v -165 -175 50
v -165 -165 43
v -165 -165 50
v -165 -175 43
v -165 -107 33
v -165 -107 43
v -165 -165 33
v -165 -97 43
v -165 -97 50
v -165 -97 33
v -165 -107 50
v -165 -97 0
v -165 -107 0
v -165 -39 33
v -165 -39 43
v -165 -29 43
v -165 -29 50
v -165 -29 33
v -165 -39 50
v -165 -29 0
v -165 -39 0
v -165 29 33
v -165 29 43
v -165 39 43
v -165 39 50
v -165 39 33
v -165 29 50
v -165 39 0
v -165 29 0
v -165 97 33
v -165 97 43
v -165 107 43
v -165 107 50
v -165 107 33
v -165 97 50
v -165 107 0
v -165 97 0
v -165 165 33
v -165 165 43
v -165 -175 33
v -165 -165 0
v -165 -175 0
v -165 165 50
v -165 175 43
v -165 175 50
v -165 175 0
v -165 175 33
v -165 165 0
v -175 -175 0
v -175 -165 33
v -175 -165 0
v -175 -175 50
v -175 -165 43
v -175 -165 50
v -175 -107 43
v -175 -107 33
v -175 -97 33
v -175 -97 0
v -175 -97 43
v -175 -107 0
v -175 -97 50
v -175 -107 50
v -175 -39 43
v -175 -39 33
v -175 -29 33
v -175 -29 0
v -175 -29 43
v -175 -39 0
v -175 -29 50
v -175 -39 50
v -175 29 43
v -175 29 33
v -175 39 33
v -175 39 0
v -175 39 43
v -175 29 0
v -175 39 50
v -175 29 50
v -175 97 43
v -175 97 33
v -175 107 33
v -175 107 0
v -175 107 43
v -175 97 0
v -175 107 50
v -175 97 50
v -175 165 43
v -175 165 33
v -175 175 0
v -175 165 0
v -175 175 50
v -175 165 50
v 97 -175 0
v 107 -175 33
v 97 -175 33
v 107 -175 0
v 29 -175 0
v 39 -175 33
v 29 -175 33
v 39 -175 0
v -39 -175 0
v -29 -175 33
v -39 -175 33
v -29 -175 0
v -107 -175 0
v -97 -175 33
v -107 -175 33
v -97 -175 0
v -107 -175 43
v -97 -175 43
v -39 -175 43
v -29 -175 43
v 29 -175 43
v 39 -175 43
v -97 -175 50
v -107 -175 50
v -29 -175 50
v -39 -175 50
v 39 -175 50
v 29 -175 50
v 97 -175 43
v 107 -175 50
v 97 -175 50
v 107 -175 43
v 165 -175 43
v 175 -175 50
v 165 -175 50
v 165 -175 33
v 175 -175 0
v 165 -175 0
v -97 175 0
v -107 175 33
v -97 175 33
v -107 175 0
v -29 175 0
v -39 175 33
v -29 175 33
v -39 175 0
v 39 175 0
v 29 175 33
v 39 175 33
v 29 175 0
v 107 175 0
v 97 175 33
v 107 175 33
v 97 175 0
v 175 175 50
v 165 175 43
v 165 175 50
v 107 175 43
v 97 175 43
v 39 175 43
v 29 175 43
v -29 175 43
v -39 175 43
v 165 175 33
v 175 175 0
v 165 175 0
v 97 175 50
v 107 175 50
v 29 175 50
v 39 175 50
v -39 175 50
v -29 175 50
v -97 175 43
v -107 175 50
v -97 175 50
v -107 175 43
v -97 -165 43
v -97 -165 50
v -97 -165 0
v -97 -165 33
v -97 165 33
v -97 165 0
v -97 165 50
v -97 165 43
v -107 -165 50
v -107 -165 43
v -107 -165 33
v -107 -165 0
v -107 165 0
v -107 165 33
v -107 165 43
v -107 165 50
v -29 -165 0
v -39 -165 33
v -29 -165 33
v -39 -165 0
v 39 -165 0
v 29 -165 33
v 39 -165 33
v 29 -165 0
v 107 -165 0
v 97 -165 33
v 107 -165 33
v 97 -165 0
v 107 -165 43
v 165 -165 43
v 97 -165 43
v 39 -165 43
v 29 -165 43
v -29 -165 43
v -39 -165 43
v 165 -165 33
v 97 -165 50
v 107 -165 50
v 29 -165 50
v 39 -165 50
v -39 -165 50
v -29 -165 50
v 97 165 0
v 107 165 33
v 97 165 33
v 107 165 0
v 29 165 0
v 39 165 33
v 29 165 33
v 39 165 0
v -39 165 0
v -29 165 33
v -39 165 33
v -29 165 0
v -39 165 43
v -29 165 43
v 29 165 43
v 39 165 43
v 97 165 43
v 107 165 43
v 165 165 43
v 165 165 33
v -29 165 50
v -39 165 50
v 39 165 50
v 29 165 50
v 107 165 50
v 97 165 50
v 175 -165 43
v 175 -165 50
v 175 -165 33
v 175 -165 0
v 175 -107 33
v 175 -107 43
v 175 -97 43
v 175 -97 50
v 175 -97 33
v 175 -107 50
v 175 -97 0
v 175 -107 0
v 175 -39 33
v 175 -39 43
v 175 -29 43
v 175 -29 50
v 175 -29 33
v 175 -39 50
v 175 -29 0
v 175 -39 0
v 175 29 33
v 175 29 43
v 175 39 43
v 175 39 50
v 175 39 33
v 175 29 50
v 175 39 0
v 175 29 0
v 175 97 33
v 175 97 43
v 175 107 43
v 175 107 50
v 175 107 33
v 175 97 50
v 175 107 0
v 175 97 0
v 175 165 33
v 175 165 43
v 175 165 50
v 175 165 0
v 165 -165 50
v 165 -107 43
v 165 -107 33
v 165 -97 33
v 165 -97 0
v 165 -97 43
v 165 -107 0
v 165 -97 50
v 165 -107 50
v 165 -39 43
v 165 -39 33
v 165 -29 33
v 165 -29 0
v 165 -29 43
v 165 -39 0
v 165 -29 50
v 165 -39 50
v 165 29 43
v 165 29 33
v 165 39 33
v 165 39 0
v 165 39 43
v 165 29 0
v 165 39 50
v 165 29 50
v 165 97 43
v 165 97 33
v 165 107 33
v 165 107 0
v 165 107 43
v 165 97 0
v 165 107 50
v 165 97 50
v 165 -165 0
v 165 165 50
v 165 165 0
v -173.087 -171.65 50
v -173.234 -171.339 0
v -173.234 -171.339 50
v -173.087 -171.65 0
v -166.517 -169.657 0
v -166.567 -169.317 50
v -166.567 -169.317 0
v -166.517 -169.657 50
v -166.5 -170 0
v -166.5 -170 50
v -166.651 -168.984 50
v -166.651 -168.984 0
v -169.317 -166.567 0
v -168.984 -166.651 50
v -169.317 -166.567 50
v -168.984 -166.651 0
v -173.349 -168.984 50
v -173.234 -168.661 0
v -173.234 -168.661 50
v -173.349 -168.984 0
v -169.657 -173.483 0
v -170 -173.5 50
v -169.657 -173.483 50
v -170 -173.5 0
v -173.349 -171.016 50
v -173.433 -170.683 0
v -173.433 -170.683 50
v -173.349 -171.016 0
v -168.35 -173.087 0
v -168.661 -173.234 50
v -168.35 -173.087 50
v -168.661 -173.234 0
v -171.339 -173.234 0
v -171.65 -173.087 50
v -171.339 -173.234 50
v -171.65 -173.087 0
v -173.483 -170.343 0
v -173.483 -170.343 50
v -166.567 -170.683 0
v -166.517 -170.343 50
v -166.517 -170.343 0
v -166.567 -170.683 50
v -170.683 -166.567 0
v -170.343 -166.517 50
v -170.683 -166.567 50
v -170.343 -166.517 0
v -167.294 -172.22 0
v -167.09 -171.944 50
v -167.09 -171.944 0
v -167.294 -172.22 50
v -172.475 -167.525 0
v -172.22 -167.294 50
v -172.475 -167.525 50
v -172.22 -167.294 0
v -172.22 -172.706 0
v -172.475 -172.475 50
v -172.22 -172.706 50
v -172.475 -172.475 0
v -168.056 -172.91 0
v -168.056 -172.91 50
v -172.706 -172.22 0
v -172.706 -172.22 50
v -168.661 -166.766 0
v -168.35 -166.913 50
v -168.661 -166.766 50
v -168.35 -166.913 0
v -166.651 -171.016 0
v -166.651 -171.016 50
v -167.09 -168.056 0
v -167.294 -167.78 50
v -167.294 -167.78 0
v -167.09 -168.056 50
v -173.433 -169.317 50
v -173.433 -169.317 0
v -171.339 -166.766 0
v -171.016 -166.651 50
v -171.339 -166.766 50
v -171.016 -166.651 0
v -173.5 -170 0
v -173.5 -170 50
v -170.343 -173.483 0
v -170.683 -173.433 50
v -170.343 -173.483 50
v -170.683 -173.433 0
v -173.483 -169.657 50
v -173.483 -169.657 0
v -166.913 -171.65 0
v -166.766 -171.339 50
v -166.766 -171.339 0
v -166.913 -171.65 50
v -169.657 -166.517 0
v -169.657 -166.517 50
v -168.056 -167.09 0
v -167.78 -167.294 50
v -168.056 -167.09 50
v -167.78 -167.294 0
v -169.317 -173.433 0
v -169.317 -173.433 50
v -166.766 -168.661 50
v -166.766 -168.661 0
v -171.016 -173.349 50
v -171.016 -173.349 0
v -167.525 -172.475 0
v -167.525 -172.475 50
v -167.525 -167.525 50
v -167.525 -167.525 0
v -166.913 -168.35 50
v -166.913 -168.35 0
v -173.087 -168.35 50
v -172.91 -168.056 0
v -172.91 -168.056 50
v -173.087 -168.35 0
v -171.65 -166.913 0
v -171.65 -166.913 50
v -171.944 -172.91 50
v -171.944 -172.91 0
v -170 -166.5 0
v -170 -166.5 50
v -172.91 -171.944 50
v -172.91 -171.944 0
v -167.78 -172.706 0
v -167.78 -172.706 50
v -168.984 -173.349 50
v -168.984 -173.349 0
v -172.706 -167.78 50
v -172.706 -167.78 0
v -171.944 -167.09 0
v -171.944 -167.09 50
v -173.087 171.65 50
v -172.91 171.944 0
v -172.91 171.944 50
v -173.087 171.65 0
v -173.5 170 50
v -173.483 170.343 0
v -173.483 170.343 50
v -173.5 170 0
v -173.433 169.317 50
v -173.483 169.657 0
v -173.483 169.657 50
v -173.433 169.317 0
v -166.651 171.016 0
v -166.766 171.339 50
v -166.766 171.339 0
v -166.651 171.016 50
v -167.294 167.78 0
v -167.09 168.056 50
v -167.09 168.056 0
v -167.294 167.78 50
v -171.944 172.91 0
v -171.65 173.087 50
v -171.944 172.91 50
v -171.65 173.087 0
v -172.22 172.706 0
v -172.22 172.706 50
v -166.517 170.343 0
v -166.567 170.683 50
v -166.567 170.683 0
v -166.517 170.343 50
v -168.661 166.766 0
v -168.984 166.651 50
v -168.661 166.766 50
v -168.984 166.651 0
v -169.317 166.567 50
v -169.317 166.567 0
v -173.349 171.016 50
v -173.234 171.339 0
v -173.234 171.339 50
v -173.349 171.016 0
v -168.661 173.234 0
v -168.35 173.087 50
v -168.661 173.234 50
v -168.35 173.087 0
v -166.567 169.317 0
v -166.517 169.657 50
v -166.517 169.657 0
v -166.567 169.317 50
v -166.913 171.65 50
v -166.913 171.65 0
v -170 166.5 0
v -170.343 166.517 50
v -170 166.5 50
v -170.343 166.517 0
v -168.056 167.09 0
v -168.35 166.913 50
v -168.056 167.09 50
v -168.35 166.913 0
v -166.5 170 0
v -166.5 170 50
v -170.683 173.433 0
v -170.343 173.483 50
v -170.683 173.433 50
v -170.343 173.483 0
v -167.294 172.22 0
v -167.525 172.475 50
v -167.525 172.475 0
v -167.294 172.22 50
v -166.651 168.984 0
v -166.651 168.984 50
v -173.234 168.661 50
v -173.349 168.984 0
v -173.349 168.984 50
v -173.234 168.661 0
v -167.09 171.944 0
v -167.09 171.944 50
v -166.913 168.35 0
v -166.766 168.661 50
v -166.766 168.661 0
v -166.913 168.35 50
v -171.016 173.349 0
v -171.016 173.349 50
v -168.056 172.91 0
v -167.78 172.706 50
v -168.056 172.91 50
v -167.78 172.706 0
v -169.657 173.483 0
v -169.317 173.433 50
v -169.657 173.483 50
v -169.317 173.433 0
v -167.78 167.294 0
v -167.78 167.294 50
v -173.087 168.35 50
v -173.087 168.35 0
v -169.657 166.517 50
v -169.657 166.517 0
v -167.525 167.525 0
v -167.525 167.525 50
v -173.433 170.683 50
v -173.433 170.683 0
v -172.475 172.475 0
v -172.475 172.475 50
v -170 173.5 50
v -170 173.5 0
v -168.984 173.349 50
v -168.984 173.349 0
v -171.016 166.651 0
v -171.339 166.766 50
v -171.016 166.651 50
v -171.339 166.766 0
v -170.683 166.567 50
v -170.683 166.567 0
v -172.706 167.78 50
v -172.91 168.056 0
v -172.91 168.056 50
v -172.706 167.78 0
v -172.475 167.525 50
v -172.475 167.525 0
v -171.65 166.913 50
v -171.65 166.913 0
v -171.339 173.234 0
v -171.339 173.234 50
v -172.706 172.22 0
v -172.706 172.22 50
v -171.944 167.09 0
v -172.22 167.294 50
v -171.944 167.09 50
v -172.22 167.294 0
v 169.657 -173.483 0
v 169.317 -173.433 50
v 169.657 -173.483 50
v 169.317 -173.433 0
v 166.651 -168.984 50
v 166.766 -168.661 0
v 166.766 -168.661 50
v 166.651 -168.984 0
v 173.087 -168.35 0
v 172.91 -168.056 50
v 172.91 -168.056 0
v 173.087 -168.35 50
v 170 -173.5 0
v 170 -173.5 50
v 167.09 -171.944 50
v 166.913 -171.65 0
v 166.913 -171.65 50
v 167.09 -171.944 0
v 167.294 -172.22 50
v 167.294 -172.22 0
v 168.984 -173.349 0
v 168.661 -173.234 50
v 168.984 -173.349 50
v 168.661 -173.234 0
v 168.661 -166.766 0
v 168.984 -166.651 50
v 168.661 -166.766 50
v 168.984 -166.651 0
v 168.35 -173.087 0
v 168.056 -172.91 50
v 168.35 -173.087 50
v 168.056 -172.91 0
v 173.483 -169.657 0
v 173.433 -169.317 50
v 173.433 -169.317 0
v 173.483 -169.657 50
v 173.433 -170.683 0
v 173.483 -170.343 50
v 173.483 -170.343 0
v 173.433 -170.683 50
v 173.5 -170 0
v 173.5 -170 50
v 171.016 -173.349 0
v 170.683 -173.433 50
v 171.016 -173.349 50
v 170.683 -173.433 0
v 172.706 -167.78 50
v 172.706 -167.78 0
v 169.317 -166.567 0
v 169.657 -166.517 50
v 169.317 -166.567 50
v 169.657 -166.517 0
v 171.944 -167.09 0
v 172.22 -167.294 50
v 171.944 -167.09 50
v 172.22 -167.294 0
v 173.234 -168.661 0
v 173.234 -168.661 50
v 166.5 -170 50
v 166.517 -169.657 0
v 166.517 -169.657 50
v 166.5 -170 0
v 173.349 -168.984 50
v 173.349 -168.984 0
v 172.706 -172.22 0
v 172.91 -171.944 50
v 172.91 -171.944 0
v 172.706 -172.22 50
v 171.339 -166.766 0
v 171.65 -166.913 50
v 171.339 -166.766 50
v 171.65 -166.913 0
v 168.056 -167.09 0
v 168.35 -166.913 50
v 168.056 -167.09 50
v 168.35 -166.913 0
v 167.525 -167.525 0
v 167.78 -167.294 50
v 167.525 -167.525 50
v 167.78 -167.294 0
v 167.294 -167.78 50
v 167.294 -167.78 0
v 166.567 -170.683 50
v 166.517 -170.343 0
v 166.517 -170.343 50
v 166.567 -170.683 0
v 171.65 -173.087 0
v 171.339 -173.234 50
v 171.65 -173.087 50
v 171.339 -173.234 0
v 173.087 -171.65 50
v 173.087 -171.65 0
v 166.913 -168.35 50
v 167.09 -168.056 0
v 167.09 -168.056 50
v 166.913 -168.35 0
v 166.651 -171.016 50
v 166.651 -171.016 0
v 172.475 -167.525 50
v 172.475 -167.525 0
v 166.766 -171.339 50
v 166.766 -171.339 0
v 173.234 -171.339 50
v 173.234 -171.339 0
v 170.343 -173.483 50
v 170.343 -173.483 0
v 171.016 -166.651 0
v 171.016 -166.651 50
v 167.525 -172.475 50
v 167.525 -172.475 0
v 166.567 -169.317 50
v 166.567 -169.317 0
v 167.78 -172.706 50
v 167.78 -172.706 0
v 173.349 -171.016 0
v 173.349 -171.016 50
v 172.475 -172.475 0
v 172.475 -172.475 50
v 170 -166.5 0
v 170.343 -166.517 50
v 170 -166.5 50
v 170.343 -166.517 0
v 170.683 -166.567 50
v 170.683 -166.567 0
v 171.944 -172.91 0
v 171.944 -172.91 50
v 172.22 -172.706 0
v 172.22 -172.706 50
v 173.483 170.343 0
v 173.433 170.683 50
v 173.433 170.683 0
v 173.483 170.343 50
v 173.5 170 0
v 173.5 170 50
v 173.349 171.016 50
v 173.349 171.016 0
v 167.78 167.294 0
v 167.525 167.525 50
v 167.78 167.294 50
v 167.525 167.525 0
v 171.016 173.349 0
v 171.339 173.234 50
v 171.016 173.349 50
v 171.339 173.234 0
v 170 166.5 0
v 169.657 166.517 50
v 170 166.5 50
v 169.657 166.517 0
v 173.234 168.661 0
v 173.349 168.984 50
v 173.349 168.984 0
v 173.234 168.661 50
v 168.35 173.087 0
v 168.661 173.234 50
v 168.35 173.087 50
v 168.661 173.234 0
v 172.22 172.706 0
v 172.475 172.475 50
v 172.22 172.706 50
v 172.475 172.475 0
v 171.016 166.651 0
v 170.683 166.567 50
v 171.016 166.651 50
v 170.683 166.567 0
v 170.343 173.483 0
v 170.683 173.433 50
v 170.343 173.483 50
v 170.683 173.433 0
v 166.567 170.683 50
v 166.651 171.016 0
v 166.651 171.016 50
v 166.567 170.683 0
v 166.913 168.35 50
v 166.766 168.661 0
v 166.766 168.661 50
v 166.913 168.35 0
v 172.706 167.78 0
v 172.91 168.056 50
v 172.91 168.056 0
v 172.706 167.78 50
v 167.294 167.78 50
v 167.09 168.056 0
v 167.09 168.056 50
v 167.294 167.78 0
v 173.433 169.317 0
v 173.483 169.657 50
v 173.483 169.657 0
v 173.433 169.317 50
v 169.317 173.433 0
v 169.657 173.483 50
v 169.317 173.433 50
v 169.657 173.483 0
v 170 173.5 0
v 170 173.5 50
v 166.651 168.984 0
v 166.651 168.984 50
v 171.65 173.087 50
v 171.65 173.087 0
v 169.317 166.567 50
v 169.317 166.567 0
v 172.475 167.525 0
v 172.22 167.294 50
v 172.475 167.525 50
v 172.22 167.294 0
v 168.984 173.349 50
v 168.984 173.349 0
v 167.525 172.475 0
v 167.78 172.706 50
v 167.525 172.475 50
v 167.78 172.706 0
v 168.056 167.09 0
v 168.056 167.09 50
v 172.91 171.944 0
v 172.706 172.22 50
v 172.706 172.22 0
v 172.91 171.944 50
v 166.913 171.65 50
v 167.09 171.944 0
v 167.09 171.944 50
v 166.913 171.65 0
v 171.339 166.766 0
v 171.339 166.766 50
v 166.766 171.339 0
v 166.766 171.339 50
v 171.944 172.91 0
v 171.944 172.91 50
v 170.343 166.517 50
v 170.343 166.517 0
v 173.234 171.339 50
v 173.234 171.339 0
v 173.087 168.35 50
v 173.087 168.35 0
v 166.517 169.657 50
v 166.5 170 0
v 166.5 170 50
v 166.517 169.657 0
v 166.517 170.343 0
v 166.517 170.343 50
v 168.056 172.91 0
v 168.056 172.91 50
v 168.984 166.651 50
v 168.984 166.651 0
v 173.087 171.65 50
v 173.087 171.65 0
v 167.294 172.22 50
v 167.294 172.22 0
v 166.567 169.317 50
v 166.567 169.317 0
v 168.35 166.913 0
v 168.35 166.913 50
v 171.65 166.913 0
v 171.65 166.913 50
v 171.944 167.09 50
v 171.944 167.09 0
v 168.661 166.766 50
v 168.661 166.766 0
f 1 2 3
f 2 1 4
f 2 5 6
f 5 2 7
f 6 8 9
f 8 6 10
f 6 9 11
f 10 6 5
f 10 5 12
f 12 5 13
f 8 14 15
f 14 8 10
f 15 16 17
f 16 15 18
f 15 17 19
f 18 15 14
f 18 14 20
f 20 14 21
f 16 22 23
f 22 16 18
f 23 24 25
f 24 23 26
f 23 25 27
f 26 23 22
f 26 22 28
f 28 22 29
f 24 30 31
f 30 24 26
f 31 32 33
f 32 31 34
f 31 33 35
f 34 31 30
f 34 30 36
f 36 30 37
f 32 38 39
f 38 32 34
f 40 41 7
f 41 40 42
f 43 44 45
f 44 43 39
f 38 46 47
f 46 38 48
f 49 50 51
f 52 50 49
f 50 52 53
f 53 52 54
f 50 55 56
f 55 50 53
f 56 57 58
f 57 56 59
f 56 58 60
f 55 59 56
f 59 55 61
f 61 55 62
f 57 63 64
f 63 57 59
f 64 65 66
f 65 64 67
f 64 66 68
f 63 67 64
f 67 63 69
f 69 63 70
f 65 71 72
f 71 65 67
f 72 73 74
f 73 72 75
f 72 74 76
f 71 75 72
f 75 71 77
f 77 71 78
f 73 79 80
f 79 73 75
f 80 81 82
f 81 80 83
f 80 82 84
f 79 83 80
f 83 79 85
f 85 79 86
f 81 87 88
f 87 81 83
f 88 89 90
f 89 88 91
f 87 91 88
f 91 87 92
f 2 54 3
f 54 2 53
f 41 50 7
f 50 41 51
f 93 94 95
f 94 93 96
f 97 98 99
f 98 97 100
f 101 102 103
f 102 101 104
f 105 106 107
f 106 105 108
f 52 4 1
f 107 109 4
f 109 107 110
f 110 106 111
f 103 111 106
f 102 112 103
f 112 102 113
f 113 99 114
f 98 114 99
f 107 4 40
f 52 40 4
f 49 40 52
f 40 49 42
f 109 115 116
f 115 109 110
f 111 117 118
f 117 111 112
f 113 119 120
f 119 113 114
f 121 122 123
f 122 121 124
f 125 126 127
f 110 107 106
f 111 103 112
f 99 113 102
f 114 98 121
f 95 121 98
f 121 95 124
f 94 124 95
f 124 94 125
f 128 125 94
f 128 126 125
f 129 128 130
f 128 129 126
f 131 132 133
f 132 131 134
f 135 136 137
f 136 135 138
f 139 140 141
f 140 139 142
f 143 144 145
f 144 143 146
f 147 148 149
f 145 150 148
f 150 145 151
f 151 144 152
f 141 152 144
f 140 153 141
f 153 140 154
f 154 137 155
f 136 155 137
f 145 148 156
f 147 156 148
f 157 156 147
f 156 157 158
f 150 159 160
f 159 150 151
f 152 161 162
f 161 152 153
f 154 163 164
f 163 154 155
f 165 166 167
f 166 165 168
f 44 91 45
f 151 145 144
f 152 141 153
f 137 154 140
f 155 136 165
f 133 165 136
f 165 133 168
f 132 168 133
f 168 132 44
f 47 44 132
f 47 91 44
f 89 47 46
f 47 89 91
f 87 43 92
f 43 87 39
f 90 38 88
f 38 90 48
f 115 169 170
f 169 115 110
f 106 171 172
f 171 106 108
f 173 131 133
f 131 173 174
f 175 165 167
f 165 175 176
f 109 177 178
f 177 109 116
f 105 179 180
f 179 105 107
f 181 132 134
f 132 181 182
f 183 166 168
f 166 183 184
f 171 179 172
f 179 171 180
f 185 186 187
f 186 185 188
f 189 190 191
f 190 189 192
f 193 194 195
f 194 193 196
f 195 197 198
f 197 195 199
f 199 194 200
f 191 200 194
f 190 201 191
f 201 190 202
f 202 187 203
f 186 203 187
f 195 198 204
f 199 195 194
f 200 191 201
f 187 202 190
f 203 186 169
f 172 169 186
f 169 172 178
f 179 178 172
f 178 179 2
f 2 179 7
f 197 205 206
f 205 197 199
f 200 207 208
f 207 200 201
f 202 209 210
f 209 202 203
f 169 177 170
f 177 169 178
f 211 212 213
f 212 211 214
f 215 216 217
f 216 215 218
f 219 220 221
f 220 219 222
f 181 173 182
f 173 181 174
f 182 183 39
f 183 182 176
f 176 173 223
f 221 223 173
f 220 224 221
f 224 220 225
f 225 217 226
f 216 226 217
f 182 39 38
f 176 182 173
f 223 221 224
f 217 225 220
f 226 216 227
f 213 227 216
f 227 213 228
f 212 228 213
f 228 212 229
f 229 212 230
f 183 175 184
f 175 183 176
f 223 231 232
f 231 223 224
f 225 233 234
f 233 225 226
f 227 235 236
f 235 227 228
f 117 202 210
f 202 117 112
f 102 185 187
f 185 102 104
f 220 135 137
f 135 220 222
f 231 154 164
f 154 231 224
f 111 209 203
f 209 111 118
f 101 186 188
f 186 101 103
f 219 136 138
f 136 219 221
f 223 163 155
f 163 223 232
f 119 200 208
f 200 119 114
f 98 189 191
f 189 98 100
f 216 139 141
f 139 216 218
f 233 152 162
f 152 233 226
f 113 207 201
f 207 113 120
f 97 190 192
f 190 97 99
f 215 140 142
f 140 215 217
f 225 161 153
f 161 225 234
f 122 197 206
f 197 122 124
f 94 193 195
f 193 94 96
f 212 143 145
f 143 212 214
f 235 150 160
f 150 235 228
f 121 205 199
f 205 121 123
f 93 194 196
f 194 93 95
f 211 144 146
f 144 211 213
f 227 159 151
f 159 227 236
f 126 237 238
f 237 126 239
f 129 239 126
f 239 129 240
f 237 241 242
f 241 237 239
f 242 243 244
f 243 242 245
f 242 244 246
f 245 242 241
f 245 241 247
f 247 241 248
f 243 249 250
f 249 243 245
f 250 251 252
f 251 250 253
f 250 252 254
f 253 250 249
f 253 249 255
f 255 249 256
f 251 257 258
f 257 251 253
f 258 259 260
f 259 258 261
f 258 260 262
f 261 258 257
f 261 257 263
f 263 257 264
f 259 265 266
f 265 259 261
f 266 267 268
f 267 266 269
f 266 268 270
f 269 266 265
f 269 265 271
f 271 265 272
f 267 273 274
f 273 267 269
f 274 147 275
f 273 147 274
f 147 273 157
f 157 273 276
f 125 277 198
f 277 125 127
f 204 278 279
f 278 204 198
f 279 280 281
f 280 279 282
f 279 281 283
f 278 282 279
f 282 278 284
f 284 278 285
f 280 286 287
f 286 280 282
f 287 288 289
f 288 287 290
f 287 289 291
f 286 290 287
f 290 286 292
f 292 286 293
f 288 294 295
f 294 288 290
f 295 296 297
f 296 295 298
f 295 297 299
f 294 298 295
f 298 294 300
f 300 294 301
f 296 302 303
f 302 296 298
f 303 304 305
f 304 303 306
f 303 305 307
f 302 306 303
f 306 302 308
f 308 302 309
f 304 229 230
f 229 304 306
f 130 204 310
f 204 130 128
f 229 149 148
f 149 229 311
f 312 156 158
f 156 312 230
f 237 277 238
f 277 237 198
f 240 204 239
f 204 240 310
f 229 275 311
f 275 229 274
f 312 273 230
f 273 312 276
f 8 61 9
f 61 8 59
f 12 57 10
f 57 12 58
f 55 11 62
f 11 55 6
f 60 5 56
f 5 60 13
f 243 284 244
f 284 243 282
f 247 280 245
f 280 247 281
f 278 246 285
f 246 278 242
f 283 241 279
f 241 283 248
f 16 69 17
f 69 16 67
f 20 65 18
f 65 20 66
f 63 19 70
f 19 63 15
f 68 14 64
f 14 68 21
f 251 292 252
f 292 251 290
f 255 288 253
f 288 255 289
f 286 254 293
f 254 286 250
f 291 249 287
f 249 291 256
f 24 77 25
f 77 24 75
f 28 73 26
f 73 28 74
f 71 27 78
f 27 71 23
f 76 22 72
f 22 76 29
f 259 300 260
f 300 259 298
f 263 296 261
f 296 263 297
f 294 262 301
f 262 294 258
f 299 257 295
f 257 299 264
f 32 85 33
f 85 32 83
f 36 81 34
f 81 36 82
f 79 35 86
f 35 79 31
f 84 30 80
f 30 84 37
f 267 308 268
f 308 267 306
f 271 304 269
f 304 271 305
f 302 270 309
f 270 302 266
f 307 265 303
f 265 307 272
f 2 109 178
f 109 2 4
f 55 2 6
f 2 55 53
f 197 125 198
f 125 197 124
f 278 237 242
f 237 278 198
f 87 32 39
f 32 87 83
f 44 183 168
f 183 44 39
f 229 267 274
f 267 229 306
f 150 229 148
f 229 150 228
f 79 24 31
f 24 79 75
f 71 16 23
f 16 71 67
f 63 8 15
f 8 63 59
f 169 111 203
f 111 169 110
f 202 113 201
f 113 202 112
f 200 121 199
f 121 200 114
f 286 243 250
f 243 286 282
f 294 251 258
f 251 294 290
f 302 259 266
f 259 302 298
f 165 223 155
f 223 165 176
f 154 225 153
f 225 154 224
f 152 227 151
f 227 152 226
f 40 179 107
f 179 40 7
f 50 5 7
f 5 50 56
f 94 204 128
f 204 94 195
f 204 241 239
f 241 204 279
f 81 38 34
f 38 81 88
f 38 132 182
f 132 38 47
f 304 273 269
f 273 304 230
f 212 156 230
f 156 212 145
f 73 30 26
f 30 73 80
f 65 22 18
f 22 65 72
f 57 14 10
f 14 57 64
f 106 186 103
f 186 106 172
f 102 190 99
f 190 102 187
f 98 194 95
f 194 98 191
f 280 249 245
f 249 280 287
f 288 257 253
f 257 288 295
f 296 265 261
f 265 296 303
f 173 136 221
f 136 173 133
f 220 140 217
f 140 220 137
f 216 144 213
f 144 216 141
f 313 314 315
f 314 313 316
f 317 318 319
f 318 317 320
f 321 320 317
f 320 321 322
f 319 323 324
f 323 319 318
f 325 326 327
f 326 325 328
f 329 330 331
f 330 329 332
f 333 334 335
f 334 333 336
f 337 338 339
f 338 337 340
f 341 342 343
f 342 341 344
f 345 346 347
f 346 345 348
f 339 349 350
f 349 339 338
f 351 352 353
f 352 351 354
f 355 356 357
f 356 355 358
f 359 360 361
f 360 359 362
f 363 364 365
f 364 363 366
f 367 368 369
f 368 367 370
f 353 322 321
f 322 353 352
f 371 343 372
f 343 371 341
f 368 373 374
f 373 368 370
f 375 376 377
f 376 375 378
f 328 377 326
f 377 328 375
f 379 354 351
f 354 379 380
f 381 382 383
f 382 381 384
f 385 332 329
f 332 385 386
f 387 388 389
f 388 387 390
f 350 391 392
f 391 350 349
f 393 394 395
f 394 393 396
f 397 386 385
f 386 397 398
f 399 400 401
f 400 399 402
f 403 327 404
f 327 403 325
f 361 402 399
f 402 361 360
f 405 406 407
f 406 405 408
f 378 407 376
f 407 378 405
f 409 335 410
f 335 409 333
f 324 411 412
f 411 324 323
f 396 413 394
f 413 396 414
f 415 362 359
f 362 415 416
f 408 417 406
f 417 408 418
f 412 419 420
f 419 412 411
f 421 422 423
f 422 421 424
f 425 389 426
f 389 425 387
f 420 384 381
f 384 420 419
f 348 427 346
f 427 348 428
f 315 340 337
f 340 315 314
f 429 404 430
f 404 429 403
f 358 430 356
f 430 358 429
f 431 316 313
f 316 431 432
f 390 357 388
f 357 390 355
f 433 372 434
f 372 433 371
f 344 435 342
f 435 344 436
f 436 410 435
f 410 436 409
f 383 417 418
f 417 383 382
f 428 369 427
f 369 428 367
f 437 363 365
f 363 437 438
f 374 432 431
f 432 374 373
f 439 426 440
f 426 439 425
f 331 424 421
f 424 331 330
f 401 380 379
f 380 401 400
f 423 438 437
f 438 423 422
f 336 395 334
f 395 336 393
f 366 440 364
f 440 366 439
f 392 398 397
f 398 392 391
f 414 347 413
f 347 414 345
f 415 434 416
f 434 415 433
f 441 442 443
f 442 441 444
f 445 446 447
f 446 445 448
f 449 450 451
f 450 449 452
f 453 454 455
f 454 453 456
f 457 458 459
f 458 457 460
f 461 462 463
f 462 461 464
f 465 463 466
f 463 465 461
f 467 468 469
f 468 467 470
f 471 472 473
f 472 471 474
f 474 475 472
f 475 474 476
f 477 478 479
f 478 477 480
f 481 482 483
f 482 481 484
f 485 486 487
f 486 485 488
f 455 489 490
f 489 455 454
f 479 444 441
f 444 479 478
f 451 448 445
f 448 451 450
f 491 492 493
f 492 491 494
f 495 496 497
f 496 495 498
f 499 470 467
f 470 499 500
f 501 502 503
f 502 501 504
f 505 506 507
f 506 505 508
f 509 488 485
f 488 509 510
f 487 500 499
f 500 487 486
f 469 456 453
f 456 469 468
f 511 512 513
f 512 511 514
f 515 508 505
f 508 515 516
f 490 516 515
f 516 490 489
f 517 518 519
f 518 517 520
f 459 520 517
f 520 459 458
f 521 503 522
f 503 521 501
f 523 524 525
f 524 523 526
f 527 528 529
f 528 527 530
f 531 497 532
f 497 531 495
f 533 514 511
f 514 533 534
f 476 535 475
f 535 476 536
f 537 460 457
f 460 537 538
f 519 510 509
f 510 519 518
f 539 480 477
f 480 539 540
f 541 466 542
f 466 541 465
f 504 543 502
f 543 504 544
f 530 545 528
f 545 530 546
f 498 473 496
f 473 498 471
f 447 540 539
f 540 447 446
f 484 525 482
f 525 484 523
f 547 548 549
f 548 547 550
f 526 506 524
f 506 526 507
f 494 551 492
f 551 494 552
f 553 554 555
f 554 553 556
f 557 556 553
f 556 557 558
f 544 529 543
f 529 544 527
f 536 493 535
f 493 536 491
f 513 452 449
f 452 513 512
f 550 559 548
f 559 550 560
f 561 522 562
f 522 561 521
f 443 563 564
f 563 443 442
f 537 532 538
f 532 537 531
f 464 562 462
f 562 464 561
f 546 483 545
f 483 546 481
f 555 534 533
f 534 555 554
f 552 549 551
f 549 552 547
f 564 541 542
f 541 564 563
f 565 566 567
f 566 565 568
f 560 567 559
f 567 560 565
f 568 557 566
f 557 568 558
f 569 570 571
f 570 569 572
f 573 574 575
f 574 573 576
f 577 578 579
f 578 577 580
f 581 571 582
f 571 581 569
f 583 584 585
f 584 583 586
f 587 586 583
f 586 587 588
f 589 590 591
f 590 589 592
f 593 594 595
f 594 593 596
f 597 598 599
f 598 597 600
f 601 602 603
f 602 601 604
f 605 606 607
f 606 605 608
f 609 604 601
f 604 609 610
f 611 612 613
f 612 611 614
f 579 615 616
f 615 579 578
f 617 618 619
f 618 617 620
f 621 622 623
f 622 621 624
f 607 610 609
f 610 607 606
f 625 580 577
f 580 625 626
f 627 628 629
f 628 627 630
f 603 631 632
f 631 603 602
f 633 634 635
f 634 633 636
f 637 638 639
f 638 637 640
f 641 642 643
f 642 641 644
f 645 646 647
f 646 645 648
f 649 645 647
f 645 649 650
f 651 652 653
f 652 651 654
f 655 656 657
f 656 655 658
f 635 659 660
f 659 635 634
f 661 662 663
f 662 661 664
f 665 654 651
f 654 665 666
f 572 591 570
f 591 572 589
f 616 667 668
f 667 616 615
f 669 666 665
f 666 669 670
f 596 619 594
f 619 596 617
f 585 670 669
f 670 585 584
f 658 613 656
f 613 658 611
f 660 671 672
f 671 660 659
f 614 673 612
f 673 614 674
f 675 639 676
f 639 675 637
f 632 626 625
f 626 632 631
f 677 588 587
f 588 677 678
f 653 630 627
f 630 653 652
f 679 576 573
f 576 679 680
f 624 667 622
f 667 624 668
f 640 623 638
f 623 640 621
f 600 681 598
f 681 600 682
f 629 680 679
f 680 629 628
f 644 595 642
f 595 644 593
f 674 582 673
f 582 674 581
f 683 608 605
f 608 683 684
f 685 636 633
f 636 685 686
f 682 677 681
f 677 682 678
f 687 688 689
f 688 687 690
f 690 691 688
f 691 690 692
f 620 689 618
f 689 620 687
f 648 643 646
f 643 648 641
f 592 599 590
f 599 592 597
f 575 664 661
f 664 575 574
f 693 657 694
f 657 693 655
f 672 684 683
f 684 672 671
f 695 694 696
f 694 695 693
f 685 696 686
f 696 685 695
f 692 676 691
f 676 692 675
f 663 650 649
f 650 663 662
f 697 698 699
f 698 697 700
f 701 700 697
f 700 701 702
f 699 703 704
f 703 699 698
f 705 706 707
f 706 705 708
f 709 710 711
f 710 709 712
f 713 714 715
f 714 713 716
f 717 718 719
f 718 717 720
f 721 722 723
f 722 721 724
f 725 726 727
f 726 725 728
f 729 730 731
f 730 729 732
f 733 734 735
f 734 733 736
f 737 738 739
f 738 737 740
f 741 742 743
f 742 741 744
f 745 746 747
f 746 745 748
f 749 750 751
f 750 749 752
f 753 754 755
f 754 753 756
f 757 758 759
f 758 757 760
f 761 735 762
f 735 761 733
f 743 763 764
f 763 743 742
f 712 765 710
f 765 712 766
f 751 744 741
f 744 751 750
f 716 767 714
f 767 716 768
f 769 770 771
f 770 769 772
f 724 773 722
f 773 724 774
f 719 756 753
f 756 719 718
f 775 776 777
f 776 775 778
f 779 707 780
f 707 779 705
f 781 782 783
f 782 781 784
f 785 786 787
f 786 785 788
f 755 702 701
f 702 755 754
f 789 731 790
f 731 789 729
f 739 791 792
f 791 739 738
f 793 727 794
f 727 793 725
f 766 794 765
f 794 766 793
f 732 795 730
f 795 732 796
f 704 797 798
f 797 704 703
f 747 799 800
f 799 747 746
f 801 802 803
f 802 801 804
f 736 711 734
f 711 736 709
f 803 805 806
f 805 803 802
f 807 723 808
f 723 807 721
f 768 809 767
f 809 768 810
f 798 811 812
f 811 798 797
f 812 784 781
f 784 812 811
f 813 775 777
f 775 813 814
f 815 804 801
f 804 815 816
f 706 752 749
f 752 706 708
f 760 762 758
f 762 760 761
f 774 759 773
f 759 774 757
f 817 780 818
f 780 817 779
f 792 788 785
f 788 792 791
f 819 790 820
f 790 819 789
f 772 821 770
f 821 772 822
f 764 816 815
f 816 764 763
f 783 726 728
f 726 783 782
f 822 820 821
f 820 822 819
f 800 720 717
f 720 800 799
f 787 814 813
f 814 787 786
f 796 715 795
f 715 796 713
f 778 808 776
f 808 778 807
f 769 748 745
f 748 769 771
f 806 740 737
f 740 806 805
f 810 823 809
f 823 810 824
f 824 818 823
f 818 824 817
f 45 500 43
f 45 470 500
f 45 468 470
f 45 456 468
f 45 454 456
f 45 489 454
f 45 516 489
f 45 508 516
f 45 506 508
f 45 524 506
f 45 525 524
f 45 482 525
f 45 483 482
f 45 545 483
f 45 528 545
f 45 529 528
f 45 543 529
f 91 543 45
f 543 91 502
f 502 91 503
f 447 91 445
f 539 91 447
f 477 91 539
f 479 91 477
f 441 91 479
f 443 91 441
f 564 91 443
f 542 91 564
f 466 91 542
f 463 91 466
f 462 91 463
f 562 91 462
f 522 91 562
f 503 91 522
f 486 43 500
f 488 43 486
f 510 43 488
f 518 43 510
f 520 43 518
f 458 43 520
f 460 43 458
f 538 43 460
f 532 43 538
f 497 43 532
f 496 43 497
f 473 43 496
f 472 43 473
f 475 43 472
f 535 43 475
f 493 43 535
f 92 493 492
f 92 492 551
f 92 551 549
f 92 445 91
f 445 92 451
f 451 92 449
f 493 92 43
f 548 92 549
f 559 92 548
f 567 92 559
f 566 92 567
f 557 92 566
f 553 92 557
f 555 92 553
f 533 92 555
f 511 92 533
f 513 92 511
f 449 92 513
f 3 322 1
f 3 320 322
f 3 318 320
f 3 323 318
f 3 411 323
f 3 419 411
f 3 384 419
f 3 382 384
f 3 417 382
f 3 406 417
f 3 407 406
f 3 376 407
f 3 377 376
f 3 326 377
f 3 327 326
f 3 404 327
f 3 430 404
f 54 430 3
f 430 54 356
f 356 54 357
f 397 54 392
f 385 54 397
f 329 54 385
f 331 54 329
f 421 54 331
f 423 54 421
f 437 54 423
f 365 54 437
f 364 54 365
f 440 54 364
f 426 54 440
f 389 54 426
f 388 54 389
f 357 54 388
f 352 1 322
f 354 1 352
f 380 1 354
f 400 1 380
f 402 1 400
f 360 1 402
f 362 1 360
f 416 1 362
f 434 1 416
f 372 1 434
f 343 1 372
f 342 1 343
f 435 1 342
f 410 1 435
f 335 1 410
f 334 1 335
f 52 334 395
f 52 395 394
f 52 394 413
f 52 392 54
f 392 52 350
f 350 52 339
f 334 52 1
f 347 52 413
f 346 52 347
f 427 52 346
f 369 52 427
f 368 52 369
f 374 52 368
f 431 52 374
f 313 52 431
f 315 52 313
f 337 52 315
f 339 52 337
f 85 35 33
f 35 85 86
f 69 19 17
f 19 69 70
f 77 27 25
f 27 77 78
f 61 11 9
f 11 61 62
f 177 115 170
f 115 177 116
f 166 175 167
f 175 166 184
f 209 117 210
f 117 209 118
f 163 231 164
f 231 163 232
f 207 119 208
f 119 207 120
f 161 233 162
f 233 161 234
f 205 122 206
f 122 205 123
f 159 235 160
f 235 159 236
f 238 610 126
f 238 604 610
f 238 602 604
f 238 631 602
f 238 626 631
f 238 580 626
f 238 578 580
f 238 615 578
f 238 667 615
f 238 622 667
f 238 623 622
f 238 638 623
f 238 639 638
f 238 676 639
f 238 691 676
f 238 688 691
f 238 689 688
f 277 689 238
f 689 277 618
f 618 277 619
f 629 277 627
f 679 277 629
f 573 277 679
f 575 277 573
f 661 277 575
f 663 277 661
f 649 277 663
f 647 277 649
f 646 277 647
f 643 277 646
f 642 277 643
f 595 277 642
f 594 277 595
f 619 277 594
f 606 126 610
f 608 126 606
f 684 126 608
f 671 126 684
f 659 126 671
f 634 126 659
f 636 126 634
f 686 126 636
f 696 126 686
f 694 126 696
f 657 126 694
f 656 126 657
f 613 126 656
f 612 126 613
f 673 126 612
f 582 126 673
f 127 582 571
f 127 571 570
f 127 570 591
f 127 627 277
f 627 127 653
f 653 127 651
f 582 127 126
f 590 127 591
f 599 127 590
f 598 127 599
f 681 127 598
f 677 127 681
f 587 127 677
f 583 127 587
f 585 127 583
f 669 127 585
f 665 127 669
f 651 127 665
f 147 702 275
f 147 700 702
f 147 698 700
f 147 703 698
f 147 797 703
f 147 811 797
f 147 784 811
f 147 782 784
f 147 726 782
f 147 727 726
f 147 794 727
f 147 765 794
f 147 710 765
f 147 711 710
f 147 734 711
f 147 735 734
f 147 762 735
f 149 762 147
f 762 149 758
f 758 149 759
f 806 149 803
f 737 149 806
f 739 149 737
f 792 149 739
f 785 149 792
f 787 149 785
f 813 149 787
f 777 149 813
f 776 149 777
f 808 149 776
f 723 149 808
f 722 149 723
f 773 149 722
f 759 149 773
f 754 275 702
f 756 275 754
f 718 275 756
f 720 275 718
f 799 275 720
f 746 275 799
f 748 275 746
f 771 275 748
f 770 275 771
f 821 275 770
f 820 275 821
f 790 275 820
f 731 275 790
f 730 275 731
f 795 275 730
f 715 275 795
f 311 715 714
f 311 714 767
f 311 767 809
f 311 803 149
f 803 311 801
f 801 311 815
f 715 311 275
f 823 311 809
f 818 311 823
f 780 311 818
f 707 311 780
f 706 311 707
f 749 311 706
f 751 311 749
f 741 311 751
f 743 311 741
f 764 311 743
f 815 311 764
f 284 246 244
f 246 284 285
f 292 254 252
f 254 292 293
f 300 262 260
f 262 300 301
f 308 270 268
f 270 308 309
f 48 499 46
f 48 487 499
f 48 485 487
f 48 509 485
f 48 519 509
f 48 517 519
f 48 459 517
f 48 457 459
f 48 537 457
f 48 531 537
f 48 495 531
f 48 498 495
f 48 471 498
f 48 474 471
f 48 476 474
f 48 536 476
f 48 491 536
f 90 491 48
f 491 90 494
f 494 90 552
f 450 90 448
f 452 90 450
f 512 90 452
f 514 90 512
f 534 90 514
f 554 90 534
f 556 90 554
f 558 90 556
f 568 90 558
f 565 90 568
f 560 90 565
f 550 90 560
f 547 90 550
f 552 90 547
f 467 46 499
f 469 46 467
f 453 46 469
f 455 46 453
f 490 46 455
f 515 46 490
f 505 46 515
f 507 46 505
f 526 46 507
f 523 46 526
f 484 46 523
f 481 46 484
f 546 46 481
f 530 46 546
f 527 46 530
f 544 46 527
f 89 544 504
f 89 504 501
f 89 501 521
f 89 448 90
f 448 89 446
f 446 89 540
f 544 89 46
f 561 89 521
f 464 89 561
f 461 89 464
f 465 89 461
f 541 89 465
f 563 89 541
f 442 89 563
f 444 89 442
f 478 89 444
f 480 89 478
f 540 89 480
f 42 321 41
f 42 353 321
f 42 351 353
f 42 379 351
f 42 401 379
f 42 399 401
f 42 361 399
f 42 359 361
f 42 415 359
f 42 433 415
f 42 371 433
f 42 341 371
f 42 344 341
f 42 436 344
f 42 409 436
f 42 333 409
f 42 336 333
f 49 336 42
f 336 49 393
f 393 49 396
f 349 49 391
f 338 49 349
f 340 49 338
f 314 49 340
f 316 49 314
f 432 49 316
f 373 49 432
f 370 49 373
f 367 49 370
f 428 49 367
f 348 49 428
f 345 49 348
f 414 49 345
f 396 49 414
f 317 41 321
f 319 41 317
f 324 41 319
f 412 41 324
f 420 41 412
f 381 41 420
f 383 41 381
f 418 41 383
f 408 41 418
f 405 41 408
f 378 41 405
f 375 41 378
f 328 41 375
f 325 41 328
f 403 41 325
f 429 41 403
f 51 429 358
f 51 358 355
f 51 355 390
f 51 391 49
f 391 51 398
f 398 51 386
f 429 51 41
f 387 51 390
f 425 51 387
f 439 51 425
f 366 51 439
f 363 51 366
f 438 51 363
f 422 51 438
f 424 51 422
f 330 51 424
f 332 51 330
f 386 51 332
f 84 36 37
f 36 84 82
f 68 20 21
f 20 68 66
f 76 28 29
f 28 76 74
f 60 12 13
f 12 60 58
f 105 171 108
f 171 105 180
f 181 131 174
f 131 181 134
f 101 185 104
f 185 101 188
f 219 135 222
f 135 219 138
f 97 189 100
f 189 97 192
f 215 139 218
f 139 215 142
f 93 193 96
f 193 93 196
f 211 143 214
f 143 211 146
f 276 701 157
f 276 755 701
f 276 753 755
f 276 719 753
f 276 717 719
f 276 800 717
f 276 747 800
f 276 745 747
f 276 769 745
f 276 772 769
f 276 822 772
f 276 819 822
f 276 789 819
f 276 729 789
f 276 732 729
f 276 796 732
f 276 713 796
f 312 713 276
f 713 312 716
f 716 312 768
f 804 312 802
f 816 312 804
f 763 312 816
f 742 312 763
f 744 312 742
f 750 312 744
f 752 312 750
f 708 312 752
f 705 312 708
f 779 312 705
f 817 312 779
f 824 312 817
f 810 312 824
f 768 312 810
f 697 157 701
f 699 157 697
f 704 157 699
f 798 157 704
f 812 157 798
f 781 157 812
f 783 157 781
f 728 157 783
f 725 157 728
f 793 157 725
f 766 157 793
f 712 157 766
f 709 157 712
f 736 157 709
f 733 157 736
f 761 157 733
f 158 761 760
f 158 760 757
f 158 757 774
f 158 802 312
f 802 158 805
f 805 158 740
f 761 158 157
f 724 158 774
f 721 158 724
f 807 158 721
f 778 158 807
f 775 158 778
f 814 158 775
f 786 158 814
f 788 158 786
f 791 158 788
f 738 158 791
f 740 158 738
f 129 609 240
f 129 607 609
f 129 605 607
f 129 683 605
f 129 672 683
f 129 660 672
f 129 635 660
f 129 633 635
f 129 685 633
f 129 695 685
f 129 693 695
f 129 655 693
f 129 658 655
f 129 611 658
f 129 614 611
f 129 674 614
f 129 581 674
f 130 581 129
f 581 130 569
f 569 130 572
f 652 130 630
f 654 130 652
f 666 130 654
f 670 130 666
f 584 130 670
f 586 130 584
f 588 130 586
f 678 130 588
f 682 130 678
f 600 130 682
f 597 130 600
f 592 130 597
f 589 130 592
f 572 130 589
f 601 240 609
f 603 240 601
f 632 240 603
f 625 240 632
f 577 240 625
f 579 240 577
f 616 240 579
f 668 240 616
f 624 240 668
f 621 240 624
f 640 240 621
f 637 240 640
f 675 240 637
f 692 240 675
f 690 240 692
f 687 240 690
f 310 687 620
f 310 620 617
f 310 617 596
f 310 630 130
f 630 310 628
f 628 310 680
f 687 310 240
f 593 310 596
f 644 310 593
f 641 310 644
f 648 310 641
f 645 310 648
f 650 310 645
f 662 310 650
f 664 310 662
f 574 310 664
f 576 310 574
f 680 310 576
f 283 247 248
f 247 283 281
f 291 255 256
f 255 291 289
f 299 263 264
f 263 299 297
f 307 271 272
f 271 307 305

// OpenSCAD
// Cage slice - index 9
bar = 10;
outer = 350;
half = outer / 2;
height = 700;

N_xy = 6;
N_z  = 11;

x_spacing = (outer - bar) / (N_xy - 1);
z_spacing = (height - bar) / (N_z  - 1);

xs = [ for (i = [0 : N_xy - 1]) (-half + bar/2 + i * x_spacing) ];
ys = xs;

zs = [ for (k = [0 : N_z - 1]) (bar/2 + k * z_spacing) ];

$fn = 64;

module cage_bars() {
    union() {
        // Vertical bars on front and back faces
        for (xv = xs) {
            translate([xv, -half + bar/2, height/2])
                cube([bar, bar, height], center = true);
            translate([xv,  half - bar/2, height/2])
                cube([bar, bar, height], center = true);
        }

        // Vertical bars on left and right faces
        for (yv = ys) {
            translate([-half + bar/2, yv, height/2])
                cube([bar, bar, height], center = true);
            translate([ half - bar/2, yv, height/2])
                cube([bar, bar, height], center = true);
        }

        // Horizontal x-bars on front and back faces
        for (zv = zs) {
            translate([0, -half + bar/2, zv])
                cube([outer, bar, bar], center = true);
            translate([0,  half - bar/2, zv])
                cube([outer, bar, bar], center = true);
        }

        // Horizontal y-bars on left and right faces
        for (zv = zs) {
            translate([-half + bar/2, 0, zv])
                cube([bar, outer, bar], center = true);
            translate([ half - bar/2, 0, zv])
                cube([bar, outer, bar], center = true);
        }

        // Floor and ceiling extra x-bars at all y positions
        z_floor = bar/2;
        z_ceil  = height - bar/2;
        for (yv = ys) {
            translate([0, yv, z_floor])
                cube([outer, bar, bar], center = true);
            translate([0, yv, z_ceil])
                cube([outer, bar, bar], center = true);
        }

        // Floor and ceiling extra y-bars at all x positions
        for (xv = xs) {
            translate([xv, 0, z_floor])
                cube([bar, outer, bar], center = true);
            translate([xv, 0, z_ceil])
                cube([bar, outer, bar], center = true);
        }
    }
}

module corner_holes() {
    hole_d = 7;
    for (sx = [-1, 1])
        for (sy = [-1, 1])
            translate([sx * (half - bar/2), sy * (half - bar/2), height/2])
                cylinder(h = height + 2, d = hole_d, center = true);
}

module cage_full() {
    difference() {
        cage_bars();
        corner_holes();
    }
}

slice_index = 9;
slice_height = 50;

module cage_slice() {
    translate([0, 0, -slice_index * slice_height]) {
        intersection() {
            cage_full();
            translate([0, 0, slice_index * slice_height + slice_height/2])
                cube([outer + 20, outer + 20, slice_height], center = true);
        }
    }
}

cage_slice();
